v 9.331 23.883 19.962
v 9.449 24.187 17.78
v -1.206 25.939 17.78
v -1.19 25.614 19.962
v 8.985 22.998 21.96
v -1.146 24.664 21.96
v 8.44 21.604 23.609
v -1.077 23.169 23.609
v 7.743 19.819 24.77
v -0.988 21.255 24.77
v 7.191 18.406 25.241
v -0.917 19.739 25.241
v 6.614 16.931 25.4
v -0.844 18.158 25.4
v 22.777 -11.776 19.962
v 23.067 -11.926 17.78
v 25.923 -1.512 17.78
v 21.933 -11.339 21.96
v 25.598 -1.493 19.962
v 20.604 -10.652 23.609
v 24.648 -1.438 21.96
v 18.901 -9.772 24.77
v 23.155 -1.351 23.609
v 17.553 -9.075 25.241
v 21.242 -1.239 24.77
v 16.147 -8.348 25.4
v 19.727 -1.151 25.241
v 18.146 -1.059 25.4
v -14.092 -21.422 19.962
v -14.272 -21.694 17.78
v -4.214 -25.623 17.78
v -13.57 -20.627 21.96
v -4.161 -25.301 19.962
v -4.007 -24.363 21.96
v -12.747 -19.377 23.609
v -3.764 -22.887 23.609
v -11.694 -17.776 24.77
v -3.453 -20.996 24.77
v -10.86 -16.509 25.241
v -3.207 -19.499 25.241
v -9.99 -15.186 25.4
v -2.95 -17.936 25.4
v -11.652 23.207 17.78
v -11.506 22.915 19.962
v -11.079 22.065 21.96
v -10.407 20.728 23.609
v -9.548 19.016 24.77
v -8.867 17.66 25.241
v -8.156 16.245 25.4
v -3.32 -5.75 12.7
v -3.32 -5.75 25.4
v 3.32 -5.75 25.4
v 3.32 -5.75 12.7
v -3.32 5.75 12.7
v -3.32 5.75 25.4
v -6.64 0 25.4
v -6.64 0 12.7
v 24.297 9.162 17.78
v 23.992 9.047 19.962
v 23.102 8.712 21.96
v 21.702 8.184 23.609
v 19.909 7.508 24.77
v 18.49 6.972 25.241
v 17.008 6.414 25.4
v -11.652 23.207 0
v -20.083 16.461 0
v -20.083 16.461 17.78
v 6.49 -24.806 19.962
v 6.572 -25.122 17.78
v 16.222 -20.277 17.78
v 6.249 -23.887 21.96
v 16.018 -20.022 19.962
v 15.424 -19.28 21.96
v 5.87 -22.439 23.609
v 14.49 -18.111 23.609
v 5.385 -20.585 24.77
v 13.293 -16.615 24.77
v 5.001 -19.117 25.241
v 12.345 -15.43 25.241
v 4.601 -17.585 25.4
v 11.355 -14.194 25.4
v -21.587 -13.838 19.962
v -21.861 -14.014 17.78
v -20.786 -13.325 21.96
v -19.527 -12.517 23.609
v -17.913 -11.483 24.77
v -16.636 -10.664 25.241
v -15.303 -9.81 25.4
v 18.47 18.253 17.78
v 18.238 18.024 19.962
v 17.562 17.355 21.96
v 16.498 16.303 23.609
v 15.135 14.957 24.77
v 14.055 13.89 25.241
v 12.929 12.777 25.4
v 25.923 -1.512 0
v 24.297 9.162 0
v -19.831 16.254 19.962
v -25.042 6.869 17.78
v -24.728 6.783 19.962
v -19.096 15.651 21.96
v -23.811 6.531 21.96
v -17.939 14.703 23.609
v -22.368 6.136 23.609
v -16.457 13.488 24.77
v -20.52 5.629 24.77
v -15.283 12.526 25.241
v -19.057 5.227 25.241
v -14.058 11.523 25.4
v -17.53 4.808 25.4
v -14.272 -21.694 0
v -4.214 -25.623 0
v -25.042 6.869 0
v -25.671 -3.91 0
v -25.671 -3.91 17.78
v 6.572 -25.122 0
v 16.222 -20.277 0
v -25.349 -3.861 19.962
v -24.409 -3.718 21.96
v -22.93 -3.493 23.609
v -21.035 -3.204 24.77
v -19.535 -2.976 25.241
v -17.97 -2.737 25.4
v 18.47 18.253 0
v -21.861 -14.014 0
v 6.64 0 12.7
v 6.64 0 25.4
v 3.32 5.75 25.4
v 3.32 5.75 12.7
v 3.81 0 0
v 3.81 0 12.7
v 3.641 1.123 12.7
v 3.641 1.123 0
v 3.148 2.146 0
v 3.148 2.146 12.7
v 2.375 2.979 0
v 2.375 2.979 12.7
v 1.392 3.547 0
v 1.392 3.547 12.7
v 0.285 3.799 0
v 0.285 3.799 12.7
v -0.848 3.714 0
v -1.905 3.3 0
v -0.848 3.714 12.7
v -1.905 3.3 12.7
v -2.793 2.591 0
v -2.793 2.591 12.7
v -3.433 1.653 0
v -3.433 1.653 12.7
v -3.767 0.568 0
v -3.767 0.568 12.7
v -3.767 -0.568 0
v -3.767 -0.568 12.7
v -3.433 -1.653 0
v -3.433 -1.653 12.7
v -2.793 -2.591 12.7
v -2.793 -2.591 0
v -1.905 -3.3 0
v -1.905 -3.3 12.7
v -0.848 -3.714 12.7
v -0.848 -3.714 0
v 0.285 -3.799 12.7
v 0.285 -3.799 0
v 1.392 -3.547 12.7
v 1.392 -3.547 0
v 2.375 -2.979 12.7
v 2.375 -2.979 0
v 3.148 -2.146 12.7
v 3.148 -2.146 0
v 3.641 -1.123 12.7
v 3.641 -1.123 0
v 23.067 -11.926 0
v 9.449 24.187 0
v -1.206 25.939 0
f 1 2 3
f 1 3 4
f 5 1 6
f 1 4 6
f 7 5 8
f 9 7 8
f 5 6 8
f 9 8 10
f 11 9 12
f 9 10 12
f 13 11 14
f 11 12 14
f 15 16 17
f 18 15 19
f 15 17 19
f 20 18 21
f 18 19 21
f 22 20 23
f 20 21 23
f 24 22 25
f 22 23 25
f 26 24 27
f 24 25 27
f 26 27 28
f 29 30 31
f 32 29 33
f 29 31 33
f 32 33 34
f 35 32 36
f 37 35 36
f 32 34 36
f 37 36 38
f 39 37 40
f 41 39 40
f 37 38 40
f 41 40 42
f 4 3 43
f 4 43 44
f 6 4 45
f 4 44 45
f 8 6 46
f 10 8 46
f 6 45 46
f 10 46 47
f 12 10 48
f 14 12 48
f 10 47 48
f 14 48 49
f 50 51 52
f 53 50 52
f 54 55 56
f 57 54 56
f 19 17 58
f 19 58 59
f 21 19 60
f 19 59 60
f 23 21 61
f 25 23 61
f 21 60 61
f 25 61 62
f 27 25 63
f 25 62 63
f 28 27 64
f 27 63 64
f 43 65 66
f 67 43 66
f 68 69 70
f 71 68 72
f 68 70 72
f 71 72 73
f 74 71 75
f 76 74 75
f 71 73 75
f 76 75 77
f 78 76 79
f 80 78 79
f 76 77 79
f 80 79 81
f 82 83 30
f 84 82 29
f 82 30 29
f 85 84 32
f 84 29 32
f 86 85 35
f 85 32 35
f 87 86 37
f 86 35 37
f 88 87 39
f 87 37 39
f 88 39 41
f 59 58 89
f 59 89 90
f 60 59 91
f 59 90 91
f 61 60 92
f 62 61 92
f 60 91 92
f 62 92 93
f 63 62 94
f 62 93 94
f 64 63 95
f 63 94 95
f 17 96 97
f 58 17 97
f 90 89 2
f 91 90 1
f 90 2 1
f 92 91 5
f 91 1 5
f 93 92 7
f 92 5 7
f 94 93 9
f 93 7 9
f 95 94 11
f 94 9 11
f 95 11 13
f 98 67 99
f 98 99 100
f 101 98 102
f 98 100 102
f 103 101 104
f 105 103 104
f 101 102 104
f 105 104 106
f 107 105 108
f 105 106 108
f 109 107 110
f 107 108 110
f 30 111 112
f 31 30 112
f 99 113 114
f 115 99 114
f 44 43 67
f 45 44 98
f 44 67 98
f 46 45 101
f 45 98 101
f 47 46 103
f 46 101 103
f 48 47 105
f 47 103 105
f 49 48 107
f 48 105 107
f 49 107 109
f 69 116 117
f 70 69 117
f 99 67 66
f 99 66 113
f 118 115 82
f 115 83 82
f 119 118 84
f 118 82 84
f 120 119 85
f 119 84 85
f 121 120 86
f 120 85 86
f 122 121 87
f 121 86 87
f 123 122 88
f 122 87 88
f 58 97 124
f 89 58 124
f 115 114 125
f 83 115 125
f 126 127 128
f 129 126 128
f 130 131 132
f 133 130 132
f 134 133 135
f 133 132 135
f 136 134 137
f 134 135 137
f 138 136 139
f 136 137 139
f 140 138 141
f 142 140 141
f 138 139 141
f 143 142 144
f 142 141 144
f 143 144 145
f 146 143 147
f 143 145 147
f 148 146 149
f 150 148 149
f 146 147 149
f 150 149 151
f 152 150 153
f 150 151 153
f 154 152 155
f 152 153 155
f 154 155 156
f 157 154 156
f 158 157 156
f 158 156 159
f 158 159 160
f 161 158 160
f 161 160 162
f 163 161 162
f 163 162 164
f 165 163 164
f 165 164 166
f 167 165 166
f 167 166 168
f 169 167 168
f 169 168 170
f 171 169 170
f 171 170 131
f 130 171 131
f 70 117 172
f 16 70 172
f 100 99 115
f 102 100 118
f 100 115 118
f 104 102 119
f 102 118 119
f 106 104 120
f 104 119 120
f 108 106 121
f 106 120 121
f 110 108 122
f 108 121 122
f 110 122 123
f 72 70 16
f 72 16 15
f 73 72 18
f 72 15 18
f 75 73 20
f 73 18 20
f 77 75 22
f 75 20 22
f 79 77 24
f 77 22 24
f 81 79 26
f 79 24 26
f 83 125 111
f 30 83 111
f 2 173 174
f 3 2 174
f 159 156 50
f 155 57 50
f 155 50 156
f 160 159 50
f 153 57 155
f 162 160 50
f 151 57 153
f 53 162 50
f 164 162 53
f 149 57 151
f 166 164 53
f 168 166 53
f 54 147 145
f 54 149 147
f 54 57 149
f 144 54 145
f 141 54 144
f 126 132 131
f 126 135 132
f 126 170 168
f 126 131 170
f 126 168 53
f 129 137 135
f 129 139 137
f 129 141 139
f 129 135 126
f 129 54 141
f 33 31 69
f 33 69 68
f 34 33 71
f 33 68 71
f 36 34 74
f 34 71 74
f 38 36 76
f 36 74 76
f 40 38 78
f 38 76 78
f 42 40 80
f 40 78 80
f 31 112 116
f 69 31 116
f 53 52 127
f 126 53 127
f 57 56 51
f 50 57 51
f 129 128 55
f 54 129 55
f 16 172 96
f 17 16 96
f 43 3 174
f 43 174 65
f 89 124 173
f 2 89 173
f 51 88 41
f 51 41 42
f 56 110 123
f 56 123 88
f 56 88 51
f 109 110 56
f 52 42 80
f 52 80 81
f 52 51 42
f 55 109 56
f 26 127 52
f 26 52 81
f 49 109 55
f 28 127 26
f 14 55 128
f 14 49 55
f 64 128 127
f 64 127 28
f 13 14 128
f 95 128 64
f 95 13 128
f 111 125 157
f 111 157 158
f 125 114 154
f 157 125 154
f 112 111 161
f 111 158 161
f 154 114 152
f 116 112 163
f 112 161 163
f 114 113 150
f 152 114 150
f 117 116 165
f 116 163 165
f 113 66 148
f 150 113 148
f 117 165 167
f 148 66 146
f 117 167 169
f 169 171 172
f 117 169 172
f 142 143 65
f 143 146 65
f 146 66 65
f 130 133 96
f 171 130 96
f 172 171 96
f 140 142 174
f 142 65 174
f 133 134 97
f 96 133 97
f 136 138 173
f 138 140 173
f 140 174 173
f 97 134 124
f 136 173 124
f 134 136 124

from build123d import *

# Parameters (mm, degrees)
F1_DEPTH = 25.4
F2_R     = 7.62
F4_DEPTH = 12.7
F5_R     = 3.81
F6_DEPTH = 25.4


with BuildPart() as f1:
    # F0 (on Top) → F1 (new body)
    with BuildSketch(Plane.XY):
        Polygon((6.572324, -25.121964), (16.22214, -20.276851), (23.067001, -11.925686), (25.923367, -1.512462), (24.297348, 9.162281), (18.470097, 18.252782), (9.449198, 24.187211), (-1.205553, 25.939452), (-11.651853, 23.206526), (-20.083442, 16.46098), (-25.042421, 6.869182), (-25.671338, -3.91036), (-21.861448, -14.013766), (-14.271514, -21.694064), (-4.213906, -25.623261), align=None)
    extrude(amount=F1_DEPTH)

    # F2
    f2_edges = [f1.edges().sort_by_distance(p)[0] for p in [
        (-18.066481, -17.853915, 25.4),
        (-9.24271, -23.658662, 25.4),
        (1.179209, -25.372613, 25.4),
        (11.397232, -22.699407, 25.4),
        (19.644571, -16.101268, 25.4),
        (24.495184, -6.719074, 25.4),
        (25.110358, 3.82491, 25.4),
        (21.383722, 13.707531, 25.4),
        (13.959647, 21.219996, 25.4),
        (4.121822, 25.063331, 25.4),
        (-6.428703, 24.572989, 25.4),
        (-15.867648, 19.833753, 25.4),
        (-22.562932, 11.665081, 25.4),
        (-25.35688, 1.479411, 25.4),
        (-23.766393, -8.962063, 25.4),
    ]]
    fillet(f2_edges, radius=F2_R)

    # F3 (on face) → F4 (cut)
    with BuildSketch(Plane.XY.offset(25.4)):
        Polygon((-3.319764, -5.75), (3.319764, -5.75), (6.639528, 0), (3.319764, 5.75), (-3.319764, 5.75), (-6.639528, 0), align=None)
    extrude(amount=-F4_DEPTH, mode=Mode.SUBTRACT)

    # F5 (on face) → F6 (cut)
    with BuildSketch(Plane.XY.offset(12.7)):
        Circle(F5_R)
    extrude(amount=-F6_DEPTH, mode=Mode.SUBTRACT)


solid = f1.part
